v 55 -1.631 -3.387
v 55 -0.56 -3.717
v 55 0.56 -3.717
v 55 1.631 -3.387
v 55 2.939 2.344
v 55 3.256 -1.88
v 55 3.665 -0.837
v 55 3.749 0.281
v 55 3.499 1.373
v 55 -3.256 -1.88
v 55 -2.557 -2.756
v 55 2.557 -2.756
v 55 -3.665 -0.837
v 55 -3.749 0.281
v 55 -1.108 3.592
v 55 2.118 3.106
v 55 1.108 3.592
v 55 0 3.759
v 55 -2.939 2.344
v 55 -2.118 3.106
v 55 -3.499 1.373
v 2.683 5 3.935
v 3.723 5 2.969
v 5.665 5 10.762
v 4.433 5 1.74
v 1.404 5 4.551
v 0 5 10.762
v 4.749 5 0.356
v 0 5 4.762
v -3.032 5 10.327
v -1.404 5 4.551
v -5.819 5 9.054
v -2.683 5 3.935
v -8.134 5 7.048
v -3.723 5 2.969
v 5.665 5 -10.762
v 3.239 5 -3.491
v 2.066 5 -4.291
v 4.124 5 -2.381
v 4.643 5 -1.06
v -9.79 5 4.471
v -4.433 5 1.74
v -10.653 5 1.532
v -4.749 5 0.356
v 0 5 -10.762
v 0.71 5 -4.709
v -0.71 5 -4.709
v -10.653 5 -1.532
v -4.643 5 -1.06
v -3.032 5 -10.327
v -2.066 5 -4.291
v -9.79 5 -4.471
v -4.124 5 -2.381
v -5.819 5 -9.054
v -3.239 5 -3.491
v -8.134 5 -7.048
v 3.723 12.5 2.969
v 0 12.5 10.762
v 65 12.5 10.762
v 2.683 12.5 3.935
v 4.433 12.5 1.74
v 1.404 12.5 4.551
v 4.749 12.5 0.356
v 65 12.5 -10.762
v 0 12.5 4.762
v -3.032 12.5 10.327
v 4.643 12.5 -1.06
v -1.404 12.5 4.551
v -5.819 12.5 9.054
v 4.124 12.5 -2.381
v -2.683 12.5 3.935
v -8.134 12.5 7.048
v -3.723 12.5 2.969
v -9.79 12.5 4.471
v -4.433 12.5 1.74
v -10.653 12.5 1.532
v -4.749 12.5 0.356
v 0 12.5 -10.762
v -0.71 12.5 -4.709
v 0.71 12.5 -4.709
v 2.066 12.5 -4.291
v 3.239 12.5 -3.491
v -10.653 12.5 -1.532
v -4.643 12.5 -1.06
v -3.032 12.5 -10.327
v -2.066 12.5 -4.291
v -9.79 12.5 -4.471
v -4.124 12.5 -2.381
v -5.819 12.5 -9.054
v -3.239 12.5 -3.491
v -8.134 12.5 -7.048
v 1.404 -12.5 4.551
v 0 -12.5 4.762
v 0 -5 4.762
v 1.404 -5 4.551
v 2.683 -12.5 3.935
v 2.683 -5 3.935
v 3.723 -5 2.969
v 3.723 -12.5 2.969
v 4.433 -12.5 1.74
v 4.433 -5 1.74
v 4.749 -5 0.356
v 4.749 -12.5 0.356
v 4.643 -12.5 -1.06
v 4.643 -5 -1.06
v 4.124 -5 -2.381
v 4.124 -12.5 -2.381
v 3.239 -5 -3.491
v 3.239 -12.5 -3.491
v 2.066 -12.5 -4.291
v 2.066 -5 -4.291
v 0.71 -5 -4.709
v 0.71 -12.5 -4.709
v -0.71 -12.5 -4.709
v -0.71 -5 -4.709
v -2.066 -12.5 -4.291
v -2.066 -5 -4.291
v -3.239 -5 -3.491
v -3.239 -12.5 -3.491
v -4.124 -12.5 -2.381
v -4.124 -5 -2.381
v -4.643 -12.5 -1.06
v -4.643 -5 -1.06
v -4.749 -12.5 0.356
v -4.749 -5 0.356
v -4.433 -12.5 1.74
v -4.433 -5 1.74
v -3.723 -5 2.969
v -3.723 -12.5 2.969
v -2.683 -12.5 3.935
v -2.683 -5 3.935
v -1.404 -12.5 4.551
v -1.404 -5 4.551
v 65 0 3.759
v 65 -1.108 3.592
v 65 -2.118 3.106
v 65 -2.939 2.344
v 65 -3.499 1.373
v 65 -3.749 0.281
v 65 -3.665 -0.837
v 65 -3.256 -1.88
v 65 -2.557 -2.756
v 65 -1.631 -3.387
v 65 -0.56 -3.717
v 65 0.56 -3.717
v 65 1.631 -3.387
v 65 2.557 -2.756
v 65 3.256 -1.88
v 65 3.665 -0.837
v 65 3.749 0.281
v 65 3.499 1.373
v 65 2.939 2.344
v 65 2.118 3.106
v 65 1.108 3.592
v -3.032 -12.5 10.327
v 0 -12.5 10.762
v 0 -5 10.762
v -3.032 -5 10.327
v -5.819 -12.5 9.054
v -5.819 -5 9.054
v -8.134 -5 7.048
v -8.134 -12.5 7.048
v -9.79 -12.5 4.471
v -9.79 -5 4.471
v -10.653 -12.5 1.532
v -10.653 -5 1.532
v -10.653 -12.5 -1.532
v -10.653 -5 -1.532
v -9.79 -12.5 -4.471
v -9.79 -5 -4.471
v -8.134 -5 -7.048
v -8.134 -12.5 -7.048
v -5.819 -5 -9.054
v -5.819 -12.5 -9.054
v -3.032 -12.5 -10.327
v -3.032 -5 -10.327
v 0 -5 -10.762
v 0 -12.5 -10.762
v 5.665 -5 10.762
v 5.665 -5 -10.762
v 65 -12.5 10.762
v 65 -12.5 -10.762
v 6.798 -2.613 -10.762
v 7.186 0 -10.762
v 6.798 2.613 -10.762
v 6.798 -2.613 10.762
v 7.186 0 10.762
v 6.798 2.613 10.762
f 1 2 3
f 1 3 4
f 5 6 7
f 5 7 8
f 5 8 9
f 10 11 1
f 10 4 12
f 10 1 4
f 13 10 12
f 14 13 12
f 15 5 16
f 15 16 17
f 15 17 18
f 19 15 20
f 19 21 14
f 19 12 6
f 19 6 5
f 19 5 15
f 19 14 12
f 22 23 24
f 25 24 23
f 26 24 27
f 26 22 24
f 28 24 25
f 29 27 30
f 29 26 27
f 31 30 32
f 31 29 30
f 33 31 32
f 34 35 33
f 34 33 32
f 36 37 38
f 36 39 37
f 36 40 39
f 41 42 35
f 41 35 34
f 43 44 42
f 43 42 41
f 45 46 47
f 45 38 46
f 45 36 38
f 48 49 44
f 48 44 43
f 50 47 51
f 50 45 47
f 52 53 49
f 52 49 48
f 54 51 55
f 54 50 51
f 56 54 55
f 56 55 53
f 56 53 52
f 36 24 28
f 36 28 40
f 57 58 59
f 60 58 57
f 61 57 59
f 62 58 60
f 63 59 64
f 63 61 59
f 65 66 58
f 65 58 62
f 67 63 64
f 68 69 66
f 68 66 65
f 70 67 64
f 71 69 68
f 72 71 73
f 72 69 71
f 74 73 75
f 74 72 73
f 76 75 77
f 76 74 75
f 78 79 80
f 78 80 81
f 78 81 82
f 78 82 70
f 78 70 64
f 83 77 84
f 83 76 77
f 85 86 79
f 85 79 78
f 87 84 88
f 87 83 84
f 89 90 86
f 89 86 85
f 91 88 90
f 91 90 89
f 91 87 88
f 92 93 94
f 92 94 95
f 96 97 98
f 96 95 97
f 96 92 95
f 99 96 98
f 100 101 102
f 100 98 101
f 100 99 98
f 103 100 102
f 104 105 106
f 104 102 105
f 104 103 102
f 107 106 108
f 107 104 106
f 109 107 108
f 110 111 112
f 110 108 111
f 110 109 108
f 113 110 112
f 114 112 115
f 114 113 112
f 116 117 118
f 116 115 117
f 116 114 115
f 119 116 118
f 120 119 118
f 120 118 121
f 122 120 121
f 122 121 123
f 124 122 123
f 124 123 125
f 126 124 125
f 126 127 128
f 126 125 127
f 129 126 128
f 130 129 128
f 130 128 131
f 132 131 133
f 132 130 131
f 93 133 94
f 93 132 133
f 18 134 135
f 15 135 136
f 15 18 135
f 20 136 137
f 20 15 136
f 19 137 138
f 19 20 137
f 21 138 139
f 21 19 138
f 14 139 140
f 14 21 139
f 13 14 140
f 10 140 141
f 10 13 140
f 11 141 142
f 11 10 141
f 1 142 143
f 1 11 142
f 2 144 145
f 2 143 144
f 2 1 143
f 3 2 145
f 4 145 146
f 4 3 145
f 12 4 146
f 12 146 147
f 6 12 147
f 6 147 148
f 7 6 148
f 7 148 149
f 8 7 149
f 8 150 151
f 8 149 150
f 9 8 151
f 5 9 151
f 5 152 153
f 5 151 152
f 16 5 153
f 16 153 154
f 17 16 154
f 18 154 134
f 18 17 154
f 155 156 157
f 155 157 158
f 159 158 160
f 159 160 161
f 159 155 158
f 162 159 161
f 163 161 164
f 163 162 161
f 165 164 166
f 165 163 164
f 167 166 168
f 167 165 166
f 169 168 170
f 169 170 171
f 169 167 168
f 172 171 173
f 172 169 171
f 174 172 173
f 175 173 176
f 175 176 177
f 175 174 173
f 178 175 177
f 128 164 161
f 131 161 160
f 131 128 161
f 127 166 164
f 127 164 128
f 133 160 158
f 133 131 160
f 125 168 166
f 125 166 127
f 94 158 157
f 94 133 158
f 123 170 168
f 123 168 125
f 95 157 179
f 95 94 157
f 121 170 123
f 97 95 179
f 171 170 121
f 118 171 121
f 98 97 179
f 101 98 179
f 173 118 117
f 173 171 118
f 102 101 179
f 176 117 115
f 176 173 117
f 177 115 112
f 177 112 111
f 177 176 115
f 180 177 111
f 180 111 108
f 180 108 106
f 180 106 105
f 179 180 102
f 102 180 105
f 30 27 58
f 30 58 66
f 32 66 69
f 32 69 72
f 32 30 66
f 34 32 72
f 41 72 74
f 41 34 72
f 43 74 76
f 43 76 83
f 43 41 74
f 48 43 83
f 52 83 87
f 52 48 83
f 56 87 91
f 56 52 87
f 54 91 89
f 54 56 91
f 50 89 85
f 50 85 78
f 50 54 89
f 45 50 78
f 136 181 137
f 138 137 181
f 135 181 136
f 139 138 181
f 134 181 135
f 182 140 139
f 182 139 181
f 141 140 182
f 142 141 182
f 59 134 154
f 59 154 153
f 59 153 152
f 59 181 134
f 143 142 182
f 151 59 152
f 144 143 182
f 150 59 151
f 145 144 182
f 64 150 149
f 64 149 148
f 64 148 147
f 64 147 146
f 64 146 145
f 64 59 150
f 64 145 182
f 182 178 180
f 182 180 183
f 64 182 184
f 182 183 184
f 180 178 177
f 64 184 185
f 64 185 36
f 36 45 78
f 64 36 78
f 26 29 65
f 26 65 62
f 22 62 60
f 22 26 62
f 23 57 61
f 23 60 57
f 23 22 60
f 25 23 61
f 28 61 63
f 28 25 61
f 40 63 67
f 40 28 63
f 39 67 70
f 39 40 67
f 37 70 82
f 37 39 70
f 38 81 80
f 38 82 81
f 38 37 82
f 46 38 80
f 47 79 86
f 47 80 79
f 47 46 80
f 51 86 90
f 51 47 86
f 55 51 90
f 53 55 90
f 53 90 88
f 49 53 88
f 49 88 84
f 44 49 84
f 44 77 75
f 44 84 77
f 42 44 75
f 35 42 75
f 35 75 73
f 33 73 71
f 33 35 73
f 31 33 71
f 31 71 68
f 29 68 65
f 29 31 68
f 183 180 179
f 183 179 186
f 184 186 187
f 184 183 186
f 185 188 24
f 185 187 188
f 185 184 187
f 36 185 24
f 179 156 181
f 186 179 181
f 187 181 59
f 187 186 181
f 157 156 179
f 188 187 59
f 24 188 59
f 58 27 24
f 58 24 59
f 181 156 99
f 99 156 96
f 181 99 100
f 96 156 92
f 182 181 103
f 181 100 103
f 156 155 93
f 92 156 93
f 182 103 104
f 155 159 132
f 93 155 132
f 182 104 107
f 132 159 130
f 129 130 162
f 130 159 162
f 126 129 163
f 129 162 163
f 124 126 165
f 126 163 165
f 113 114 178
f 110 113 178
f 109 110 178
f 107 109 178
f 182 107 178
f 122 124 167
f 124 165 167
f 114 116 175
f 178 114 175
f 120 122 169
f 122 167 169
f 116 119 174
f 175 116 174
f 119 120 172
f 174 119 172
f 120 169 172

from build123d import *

# Parameters (mm, degrees)
SKETCH2_W               = 30
SKETCH2_H               = 30
BOSS_EXTRUDE3_DEPTH     = 12.5
CUT_EXTRUDE1_DEPTH      = 25.622144504
CUT_EXTRUDE1_DEPTH_BACK = 25.622144504
SKETCH1_R               = 4.7625
CUT_EXTRUDE2_DEPTH      = 30.061583319
CUT_EXTRUDE2_DEPTH_BACK = 30.061583319
SKETCH3_W               = 10.7625
SKETCH3_H               = 10
SKETCH5_W               = 21.525
SKETCH5_H               = 25
BOSS_EXTRUDE4_DEPTH     = 50
CUT_EXTRUDE3_DEPTH      = 78.537331734
CUT_EXTRUDE3_DEPTH_BACK = 10
SKETCH6_R               = 3.7592


with BuildPart() as part:
    # Sketch2 → Boss-Extrude3 (new, symmetric)
    with BuildSketch(Plane(origin=(0, 0, 0), x_dir=(1, 0, 0), z_dir=(0, 1, 0))):
        Rectangle(SKETCH2_W, SKETCH2_H)
    extrude(amount=BOSS_EXTRUDE3_DEPTH, both=True)

    # Sketch1 → Cut-Extrude1 (cut, two sides: drawn at the far end of the back side and taken through both)
    with BuildSketch(Plane(origin=(0, 0, 0), x_dir=(1, 0, 0), z_dir=(0, 1, 0)).offset(-CUT_EXTRUDE1_DEPTH_BACK)):
        with Locations(Location((0, 0, 0), (0, 0, 270))):
            Circle(SKETCH1_R)
        with BuildLine():
            ThreePointArc((0, -10.7625), (-10.7625, 0), (0, 10.7625))
            Line((0, 10.7625), (15, 10.7625))
            Line((15, 10.7625), (15, 15))
            Line((15, 15), (-15, 15))
            Line((-15, 15), (-15, -15))
            Line((-15, -15), (15, -15))
            Line((15, -15), (15, -10.7625))
            Line((15, -10.7625), (0, -10.7625))
        make_face()
    extrude(amount=CUT_EXTRUDE1_DEPTH + CUT_EXTRUDE1_DEPTH_BACK, mode=Mode.SUBTRACT)

    # Sketch3 → Cut-Extrude2 (cut, two sides: drawn at the far end of the back side and taken through both)
    with BuildSketch(Plane.XY.offset(10.7625).offset(-CUT_EXTRUDE2_DEPTH_BACK)):
        with BuildLine():
            Line((0, -5), (5.665118464, -5))
            ThreePointArc((5.665118464, -5), (7.186330553, 0), (5.665118464, 5))
            Line((5.665118464, 5), (0, 5))
            Line((0, 5), (0, -5))
        make_face()
        with Locations((-5.38125, 0)):
            Rectangle(SKETCH3_W, SKETCH3_H)
    extrude(amount=CUT_EXTRUDE2_DEPTH + CUT_EXTRUDE2_DEPTH_BACK, mode=Mode.SUBTRACT)

    # Sketch5 → Boss-Extrude4 (add)
    with BuildSketch(Plane(origin=(15, 0, 0), x_dir=(0, 0, -1), z_dir=(1, 0, 0))):
        Rectangle(SKETCH5_W, SKETCH5_H)
    extrude(amount=BOSS_EXTRUDE4_DEPTH)

    # Sketch6 → Cut-Extrude3 (cut, two sides: drawn at the far end of the back side and taken through both)
    with BuildSketch(Plane(origin=(65, 0, 0), x_dir=(0, 0, -1), z_dir=(1, 0, 0)).offset(-CUT_EXTRUDE3_DEPTH_BACK)):
        with Locations(Location((0, 0, 0), (0, 0, 180))):
            Circle(SKETCH6_R)
    extrude(amount=CUT_EXTRUDE3_DEPTH + CUT_EXTRUDE3_DEPTH_BACK, mode=Mode.SUBTRACT)


solid = part.part
